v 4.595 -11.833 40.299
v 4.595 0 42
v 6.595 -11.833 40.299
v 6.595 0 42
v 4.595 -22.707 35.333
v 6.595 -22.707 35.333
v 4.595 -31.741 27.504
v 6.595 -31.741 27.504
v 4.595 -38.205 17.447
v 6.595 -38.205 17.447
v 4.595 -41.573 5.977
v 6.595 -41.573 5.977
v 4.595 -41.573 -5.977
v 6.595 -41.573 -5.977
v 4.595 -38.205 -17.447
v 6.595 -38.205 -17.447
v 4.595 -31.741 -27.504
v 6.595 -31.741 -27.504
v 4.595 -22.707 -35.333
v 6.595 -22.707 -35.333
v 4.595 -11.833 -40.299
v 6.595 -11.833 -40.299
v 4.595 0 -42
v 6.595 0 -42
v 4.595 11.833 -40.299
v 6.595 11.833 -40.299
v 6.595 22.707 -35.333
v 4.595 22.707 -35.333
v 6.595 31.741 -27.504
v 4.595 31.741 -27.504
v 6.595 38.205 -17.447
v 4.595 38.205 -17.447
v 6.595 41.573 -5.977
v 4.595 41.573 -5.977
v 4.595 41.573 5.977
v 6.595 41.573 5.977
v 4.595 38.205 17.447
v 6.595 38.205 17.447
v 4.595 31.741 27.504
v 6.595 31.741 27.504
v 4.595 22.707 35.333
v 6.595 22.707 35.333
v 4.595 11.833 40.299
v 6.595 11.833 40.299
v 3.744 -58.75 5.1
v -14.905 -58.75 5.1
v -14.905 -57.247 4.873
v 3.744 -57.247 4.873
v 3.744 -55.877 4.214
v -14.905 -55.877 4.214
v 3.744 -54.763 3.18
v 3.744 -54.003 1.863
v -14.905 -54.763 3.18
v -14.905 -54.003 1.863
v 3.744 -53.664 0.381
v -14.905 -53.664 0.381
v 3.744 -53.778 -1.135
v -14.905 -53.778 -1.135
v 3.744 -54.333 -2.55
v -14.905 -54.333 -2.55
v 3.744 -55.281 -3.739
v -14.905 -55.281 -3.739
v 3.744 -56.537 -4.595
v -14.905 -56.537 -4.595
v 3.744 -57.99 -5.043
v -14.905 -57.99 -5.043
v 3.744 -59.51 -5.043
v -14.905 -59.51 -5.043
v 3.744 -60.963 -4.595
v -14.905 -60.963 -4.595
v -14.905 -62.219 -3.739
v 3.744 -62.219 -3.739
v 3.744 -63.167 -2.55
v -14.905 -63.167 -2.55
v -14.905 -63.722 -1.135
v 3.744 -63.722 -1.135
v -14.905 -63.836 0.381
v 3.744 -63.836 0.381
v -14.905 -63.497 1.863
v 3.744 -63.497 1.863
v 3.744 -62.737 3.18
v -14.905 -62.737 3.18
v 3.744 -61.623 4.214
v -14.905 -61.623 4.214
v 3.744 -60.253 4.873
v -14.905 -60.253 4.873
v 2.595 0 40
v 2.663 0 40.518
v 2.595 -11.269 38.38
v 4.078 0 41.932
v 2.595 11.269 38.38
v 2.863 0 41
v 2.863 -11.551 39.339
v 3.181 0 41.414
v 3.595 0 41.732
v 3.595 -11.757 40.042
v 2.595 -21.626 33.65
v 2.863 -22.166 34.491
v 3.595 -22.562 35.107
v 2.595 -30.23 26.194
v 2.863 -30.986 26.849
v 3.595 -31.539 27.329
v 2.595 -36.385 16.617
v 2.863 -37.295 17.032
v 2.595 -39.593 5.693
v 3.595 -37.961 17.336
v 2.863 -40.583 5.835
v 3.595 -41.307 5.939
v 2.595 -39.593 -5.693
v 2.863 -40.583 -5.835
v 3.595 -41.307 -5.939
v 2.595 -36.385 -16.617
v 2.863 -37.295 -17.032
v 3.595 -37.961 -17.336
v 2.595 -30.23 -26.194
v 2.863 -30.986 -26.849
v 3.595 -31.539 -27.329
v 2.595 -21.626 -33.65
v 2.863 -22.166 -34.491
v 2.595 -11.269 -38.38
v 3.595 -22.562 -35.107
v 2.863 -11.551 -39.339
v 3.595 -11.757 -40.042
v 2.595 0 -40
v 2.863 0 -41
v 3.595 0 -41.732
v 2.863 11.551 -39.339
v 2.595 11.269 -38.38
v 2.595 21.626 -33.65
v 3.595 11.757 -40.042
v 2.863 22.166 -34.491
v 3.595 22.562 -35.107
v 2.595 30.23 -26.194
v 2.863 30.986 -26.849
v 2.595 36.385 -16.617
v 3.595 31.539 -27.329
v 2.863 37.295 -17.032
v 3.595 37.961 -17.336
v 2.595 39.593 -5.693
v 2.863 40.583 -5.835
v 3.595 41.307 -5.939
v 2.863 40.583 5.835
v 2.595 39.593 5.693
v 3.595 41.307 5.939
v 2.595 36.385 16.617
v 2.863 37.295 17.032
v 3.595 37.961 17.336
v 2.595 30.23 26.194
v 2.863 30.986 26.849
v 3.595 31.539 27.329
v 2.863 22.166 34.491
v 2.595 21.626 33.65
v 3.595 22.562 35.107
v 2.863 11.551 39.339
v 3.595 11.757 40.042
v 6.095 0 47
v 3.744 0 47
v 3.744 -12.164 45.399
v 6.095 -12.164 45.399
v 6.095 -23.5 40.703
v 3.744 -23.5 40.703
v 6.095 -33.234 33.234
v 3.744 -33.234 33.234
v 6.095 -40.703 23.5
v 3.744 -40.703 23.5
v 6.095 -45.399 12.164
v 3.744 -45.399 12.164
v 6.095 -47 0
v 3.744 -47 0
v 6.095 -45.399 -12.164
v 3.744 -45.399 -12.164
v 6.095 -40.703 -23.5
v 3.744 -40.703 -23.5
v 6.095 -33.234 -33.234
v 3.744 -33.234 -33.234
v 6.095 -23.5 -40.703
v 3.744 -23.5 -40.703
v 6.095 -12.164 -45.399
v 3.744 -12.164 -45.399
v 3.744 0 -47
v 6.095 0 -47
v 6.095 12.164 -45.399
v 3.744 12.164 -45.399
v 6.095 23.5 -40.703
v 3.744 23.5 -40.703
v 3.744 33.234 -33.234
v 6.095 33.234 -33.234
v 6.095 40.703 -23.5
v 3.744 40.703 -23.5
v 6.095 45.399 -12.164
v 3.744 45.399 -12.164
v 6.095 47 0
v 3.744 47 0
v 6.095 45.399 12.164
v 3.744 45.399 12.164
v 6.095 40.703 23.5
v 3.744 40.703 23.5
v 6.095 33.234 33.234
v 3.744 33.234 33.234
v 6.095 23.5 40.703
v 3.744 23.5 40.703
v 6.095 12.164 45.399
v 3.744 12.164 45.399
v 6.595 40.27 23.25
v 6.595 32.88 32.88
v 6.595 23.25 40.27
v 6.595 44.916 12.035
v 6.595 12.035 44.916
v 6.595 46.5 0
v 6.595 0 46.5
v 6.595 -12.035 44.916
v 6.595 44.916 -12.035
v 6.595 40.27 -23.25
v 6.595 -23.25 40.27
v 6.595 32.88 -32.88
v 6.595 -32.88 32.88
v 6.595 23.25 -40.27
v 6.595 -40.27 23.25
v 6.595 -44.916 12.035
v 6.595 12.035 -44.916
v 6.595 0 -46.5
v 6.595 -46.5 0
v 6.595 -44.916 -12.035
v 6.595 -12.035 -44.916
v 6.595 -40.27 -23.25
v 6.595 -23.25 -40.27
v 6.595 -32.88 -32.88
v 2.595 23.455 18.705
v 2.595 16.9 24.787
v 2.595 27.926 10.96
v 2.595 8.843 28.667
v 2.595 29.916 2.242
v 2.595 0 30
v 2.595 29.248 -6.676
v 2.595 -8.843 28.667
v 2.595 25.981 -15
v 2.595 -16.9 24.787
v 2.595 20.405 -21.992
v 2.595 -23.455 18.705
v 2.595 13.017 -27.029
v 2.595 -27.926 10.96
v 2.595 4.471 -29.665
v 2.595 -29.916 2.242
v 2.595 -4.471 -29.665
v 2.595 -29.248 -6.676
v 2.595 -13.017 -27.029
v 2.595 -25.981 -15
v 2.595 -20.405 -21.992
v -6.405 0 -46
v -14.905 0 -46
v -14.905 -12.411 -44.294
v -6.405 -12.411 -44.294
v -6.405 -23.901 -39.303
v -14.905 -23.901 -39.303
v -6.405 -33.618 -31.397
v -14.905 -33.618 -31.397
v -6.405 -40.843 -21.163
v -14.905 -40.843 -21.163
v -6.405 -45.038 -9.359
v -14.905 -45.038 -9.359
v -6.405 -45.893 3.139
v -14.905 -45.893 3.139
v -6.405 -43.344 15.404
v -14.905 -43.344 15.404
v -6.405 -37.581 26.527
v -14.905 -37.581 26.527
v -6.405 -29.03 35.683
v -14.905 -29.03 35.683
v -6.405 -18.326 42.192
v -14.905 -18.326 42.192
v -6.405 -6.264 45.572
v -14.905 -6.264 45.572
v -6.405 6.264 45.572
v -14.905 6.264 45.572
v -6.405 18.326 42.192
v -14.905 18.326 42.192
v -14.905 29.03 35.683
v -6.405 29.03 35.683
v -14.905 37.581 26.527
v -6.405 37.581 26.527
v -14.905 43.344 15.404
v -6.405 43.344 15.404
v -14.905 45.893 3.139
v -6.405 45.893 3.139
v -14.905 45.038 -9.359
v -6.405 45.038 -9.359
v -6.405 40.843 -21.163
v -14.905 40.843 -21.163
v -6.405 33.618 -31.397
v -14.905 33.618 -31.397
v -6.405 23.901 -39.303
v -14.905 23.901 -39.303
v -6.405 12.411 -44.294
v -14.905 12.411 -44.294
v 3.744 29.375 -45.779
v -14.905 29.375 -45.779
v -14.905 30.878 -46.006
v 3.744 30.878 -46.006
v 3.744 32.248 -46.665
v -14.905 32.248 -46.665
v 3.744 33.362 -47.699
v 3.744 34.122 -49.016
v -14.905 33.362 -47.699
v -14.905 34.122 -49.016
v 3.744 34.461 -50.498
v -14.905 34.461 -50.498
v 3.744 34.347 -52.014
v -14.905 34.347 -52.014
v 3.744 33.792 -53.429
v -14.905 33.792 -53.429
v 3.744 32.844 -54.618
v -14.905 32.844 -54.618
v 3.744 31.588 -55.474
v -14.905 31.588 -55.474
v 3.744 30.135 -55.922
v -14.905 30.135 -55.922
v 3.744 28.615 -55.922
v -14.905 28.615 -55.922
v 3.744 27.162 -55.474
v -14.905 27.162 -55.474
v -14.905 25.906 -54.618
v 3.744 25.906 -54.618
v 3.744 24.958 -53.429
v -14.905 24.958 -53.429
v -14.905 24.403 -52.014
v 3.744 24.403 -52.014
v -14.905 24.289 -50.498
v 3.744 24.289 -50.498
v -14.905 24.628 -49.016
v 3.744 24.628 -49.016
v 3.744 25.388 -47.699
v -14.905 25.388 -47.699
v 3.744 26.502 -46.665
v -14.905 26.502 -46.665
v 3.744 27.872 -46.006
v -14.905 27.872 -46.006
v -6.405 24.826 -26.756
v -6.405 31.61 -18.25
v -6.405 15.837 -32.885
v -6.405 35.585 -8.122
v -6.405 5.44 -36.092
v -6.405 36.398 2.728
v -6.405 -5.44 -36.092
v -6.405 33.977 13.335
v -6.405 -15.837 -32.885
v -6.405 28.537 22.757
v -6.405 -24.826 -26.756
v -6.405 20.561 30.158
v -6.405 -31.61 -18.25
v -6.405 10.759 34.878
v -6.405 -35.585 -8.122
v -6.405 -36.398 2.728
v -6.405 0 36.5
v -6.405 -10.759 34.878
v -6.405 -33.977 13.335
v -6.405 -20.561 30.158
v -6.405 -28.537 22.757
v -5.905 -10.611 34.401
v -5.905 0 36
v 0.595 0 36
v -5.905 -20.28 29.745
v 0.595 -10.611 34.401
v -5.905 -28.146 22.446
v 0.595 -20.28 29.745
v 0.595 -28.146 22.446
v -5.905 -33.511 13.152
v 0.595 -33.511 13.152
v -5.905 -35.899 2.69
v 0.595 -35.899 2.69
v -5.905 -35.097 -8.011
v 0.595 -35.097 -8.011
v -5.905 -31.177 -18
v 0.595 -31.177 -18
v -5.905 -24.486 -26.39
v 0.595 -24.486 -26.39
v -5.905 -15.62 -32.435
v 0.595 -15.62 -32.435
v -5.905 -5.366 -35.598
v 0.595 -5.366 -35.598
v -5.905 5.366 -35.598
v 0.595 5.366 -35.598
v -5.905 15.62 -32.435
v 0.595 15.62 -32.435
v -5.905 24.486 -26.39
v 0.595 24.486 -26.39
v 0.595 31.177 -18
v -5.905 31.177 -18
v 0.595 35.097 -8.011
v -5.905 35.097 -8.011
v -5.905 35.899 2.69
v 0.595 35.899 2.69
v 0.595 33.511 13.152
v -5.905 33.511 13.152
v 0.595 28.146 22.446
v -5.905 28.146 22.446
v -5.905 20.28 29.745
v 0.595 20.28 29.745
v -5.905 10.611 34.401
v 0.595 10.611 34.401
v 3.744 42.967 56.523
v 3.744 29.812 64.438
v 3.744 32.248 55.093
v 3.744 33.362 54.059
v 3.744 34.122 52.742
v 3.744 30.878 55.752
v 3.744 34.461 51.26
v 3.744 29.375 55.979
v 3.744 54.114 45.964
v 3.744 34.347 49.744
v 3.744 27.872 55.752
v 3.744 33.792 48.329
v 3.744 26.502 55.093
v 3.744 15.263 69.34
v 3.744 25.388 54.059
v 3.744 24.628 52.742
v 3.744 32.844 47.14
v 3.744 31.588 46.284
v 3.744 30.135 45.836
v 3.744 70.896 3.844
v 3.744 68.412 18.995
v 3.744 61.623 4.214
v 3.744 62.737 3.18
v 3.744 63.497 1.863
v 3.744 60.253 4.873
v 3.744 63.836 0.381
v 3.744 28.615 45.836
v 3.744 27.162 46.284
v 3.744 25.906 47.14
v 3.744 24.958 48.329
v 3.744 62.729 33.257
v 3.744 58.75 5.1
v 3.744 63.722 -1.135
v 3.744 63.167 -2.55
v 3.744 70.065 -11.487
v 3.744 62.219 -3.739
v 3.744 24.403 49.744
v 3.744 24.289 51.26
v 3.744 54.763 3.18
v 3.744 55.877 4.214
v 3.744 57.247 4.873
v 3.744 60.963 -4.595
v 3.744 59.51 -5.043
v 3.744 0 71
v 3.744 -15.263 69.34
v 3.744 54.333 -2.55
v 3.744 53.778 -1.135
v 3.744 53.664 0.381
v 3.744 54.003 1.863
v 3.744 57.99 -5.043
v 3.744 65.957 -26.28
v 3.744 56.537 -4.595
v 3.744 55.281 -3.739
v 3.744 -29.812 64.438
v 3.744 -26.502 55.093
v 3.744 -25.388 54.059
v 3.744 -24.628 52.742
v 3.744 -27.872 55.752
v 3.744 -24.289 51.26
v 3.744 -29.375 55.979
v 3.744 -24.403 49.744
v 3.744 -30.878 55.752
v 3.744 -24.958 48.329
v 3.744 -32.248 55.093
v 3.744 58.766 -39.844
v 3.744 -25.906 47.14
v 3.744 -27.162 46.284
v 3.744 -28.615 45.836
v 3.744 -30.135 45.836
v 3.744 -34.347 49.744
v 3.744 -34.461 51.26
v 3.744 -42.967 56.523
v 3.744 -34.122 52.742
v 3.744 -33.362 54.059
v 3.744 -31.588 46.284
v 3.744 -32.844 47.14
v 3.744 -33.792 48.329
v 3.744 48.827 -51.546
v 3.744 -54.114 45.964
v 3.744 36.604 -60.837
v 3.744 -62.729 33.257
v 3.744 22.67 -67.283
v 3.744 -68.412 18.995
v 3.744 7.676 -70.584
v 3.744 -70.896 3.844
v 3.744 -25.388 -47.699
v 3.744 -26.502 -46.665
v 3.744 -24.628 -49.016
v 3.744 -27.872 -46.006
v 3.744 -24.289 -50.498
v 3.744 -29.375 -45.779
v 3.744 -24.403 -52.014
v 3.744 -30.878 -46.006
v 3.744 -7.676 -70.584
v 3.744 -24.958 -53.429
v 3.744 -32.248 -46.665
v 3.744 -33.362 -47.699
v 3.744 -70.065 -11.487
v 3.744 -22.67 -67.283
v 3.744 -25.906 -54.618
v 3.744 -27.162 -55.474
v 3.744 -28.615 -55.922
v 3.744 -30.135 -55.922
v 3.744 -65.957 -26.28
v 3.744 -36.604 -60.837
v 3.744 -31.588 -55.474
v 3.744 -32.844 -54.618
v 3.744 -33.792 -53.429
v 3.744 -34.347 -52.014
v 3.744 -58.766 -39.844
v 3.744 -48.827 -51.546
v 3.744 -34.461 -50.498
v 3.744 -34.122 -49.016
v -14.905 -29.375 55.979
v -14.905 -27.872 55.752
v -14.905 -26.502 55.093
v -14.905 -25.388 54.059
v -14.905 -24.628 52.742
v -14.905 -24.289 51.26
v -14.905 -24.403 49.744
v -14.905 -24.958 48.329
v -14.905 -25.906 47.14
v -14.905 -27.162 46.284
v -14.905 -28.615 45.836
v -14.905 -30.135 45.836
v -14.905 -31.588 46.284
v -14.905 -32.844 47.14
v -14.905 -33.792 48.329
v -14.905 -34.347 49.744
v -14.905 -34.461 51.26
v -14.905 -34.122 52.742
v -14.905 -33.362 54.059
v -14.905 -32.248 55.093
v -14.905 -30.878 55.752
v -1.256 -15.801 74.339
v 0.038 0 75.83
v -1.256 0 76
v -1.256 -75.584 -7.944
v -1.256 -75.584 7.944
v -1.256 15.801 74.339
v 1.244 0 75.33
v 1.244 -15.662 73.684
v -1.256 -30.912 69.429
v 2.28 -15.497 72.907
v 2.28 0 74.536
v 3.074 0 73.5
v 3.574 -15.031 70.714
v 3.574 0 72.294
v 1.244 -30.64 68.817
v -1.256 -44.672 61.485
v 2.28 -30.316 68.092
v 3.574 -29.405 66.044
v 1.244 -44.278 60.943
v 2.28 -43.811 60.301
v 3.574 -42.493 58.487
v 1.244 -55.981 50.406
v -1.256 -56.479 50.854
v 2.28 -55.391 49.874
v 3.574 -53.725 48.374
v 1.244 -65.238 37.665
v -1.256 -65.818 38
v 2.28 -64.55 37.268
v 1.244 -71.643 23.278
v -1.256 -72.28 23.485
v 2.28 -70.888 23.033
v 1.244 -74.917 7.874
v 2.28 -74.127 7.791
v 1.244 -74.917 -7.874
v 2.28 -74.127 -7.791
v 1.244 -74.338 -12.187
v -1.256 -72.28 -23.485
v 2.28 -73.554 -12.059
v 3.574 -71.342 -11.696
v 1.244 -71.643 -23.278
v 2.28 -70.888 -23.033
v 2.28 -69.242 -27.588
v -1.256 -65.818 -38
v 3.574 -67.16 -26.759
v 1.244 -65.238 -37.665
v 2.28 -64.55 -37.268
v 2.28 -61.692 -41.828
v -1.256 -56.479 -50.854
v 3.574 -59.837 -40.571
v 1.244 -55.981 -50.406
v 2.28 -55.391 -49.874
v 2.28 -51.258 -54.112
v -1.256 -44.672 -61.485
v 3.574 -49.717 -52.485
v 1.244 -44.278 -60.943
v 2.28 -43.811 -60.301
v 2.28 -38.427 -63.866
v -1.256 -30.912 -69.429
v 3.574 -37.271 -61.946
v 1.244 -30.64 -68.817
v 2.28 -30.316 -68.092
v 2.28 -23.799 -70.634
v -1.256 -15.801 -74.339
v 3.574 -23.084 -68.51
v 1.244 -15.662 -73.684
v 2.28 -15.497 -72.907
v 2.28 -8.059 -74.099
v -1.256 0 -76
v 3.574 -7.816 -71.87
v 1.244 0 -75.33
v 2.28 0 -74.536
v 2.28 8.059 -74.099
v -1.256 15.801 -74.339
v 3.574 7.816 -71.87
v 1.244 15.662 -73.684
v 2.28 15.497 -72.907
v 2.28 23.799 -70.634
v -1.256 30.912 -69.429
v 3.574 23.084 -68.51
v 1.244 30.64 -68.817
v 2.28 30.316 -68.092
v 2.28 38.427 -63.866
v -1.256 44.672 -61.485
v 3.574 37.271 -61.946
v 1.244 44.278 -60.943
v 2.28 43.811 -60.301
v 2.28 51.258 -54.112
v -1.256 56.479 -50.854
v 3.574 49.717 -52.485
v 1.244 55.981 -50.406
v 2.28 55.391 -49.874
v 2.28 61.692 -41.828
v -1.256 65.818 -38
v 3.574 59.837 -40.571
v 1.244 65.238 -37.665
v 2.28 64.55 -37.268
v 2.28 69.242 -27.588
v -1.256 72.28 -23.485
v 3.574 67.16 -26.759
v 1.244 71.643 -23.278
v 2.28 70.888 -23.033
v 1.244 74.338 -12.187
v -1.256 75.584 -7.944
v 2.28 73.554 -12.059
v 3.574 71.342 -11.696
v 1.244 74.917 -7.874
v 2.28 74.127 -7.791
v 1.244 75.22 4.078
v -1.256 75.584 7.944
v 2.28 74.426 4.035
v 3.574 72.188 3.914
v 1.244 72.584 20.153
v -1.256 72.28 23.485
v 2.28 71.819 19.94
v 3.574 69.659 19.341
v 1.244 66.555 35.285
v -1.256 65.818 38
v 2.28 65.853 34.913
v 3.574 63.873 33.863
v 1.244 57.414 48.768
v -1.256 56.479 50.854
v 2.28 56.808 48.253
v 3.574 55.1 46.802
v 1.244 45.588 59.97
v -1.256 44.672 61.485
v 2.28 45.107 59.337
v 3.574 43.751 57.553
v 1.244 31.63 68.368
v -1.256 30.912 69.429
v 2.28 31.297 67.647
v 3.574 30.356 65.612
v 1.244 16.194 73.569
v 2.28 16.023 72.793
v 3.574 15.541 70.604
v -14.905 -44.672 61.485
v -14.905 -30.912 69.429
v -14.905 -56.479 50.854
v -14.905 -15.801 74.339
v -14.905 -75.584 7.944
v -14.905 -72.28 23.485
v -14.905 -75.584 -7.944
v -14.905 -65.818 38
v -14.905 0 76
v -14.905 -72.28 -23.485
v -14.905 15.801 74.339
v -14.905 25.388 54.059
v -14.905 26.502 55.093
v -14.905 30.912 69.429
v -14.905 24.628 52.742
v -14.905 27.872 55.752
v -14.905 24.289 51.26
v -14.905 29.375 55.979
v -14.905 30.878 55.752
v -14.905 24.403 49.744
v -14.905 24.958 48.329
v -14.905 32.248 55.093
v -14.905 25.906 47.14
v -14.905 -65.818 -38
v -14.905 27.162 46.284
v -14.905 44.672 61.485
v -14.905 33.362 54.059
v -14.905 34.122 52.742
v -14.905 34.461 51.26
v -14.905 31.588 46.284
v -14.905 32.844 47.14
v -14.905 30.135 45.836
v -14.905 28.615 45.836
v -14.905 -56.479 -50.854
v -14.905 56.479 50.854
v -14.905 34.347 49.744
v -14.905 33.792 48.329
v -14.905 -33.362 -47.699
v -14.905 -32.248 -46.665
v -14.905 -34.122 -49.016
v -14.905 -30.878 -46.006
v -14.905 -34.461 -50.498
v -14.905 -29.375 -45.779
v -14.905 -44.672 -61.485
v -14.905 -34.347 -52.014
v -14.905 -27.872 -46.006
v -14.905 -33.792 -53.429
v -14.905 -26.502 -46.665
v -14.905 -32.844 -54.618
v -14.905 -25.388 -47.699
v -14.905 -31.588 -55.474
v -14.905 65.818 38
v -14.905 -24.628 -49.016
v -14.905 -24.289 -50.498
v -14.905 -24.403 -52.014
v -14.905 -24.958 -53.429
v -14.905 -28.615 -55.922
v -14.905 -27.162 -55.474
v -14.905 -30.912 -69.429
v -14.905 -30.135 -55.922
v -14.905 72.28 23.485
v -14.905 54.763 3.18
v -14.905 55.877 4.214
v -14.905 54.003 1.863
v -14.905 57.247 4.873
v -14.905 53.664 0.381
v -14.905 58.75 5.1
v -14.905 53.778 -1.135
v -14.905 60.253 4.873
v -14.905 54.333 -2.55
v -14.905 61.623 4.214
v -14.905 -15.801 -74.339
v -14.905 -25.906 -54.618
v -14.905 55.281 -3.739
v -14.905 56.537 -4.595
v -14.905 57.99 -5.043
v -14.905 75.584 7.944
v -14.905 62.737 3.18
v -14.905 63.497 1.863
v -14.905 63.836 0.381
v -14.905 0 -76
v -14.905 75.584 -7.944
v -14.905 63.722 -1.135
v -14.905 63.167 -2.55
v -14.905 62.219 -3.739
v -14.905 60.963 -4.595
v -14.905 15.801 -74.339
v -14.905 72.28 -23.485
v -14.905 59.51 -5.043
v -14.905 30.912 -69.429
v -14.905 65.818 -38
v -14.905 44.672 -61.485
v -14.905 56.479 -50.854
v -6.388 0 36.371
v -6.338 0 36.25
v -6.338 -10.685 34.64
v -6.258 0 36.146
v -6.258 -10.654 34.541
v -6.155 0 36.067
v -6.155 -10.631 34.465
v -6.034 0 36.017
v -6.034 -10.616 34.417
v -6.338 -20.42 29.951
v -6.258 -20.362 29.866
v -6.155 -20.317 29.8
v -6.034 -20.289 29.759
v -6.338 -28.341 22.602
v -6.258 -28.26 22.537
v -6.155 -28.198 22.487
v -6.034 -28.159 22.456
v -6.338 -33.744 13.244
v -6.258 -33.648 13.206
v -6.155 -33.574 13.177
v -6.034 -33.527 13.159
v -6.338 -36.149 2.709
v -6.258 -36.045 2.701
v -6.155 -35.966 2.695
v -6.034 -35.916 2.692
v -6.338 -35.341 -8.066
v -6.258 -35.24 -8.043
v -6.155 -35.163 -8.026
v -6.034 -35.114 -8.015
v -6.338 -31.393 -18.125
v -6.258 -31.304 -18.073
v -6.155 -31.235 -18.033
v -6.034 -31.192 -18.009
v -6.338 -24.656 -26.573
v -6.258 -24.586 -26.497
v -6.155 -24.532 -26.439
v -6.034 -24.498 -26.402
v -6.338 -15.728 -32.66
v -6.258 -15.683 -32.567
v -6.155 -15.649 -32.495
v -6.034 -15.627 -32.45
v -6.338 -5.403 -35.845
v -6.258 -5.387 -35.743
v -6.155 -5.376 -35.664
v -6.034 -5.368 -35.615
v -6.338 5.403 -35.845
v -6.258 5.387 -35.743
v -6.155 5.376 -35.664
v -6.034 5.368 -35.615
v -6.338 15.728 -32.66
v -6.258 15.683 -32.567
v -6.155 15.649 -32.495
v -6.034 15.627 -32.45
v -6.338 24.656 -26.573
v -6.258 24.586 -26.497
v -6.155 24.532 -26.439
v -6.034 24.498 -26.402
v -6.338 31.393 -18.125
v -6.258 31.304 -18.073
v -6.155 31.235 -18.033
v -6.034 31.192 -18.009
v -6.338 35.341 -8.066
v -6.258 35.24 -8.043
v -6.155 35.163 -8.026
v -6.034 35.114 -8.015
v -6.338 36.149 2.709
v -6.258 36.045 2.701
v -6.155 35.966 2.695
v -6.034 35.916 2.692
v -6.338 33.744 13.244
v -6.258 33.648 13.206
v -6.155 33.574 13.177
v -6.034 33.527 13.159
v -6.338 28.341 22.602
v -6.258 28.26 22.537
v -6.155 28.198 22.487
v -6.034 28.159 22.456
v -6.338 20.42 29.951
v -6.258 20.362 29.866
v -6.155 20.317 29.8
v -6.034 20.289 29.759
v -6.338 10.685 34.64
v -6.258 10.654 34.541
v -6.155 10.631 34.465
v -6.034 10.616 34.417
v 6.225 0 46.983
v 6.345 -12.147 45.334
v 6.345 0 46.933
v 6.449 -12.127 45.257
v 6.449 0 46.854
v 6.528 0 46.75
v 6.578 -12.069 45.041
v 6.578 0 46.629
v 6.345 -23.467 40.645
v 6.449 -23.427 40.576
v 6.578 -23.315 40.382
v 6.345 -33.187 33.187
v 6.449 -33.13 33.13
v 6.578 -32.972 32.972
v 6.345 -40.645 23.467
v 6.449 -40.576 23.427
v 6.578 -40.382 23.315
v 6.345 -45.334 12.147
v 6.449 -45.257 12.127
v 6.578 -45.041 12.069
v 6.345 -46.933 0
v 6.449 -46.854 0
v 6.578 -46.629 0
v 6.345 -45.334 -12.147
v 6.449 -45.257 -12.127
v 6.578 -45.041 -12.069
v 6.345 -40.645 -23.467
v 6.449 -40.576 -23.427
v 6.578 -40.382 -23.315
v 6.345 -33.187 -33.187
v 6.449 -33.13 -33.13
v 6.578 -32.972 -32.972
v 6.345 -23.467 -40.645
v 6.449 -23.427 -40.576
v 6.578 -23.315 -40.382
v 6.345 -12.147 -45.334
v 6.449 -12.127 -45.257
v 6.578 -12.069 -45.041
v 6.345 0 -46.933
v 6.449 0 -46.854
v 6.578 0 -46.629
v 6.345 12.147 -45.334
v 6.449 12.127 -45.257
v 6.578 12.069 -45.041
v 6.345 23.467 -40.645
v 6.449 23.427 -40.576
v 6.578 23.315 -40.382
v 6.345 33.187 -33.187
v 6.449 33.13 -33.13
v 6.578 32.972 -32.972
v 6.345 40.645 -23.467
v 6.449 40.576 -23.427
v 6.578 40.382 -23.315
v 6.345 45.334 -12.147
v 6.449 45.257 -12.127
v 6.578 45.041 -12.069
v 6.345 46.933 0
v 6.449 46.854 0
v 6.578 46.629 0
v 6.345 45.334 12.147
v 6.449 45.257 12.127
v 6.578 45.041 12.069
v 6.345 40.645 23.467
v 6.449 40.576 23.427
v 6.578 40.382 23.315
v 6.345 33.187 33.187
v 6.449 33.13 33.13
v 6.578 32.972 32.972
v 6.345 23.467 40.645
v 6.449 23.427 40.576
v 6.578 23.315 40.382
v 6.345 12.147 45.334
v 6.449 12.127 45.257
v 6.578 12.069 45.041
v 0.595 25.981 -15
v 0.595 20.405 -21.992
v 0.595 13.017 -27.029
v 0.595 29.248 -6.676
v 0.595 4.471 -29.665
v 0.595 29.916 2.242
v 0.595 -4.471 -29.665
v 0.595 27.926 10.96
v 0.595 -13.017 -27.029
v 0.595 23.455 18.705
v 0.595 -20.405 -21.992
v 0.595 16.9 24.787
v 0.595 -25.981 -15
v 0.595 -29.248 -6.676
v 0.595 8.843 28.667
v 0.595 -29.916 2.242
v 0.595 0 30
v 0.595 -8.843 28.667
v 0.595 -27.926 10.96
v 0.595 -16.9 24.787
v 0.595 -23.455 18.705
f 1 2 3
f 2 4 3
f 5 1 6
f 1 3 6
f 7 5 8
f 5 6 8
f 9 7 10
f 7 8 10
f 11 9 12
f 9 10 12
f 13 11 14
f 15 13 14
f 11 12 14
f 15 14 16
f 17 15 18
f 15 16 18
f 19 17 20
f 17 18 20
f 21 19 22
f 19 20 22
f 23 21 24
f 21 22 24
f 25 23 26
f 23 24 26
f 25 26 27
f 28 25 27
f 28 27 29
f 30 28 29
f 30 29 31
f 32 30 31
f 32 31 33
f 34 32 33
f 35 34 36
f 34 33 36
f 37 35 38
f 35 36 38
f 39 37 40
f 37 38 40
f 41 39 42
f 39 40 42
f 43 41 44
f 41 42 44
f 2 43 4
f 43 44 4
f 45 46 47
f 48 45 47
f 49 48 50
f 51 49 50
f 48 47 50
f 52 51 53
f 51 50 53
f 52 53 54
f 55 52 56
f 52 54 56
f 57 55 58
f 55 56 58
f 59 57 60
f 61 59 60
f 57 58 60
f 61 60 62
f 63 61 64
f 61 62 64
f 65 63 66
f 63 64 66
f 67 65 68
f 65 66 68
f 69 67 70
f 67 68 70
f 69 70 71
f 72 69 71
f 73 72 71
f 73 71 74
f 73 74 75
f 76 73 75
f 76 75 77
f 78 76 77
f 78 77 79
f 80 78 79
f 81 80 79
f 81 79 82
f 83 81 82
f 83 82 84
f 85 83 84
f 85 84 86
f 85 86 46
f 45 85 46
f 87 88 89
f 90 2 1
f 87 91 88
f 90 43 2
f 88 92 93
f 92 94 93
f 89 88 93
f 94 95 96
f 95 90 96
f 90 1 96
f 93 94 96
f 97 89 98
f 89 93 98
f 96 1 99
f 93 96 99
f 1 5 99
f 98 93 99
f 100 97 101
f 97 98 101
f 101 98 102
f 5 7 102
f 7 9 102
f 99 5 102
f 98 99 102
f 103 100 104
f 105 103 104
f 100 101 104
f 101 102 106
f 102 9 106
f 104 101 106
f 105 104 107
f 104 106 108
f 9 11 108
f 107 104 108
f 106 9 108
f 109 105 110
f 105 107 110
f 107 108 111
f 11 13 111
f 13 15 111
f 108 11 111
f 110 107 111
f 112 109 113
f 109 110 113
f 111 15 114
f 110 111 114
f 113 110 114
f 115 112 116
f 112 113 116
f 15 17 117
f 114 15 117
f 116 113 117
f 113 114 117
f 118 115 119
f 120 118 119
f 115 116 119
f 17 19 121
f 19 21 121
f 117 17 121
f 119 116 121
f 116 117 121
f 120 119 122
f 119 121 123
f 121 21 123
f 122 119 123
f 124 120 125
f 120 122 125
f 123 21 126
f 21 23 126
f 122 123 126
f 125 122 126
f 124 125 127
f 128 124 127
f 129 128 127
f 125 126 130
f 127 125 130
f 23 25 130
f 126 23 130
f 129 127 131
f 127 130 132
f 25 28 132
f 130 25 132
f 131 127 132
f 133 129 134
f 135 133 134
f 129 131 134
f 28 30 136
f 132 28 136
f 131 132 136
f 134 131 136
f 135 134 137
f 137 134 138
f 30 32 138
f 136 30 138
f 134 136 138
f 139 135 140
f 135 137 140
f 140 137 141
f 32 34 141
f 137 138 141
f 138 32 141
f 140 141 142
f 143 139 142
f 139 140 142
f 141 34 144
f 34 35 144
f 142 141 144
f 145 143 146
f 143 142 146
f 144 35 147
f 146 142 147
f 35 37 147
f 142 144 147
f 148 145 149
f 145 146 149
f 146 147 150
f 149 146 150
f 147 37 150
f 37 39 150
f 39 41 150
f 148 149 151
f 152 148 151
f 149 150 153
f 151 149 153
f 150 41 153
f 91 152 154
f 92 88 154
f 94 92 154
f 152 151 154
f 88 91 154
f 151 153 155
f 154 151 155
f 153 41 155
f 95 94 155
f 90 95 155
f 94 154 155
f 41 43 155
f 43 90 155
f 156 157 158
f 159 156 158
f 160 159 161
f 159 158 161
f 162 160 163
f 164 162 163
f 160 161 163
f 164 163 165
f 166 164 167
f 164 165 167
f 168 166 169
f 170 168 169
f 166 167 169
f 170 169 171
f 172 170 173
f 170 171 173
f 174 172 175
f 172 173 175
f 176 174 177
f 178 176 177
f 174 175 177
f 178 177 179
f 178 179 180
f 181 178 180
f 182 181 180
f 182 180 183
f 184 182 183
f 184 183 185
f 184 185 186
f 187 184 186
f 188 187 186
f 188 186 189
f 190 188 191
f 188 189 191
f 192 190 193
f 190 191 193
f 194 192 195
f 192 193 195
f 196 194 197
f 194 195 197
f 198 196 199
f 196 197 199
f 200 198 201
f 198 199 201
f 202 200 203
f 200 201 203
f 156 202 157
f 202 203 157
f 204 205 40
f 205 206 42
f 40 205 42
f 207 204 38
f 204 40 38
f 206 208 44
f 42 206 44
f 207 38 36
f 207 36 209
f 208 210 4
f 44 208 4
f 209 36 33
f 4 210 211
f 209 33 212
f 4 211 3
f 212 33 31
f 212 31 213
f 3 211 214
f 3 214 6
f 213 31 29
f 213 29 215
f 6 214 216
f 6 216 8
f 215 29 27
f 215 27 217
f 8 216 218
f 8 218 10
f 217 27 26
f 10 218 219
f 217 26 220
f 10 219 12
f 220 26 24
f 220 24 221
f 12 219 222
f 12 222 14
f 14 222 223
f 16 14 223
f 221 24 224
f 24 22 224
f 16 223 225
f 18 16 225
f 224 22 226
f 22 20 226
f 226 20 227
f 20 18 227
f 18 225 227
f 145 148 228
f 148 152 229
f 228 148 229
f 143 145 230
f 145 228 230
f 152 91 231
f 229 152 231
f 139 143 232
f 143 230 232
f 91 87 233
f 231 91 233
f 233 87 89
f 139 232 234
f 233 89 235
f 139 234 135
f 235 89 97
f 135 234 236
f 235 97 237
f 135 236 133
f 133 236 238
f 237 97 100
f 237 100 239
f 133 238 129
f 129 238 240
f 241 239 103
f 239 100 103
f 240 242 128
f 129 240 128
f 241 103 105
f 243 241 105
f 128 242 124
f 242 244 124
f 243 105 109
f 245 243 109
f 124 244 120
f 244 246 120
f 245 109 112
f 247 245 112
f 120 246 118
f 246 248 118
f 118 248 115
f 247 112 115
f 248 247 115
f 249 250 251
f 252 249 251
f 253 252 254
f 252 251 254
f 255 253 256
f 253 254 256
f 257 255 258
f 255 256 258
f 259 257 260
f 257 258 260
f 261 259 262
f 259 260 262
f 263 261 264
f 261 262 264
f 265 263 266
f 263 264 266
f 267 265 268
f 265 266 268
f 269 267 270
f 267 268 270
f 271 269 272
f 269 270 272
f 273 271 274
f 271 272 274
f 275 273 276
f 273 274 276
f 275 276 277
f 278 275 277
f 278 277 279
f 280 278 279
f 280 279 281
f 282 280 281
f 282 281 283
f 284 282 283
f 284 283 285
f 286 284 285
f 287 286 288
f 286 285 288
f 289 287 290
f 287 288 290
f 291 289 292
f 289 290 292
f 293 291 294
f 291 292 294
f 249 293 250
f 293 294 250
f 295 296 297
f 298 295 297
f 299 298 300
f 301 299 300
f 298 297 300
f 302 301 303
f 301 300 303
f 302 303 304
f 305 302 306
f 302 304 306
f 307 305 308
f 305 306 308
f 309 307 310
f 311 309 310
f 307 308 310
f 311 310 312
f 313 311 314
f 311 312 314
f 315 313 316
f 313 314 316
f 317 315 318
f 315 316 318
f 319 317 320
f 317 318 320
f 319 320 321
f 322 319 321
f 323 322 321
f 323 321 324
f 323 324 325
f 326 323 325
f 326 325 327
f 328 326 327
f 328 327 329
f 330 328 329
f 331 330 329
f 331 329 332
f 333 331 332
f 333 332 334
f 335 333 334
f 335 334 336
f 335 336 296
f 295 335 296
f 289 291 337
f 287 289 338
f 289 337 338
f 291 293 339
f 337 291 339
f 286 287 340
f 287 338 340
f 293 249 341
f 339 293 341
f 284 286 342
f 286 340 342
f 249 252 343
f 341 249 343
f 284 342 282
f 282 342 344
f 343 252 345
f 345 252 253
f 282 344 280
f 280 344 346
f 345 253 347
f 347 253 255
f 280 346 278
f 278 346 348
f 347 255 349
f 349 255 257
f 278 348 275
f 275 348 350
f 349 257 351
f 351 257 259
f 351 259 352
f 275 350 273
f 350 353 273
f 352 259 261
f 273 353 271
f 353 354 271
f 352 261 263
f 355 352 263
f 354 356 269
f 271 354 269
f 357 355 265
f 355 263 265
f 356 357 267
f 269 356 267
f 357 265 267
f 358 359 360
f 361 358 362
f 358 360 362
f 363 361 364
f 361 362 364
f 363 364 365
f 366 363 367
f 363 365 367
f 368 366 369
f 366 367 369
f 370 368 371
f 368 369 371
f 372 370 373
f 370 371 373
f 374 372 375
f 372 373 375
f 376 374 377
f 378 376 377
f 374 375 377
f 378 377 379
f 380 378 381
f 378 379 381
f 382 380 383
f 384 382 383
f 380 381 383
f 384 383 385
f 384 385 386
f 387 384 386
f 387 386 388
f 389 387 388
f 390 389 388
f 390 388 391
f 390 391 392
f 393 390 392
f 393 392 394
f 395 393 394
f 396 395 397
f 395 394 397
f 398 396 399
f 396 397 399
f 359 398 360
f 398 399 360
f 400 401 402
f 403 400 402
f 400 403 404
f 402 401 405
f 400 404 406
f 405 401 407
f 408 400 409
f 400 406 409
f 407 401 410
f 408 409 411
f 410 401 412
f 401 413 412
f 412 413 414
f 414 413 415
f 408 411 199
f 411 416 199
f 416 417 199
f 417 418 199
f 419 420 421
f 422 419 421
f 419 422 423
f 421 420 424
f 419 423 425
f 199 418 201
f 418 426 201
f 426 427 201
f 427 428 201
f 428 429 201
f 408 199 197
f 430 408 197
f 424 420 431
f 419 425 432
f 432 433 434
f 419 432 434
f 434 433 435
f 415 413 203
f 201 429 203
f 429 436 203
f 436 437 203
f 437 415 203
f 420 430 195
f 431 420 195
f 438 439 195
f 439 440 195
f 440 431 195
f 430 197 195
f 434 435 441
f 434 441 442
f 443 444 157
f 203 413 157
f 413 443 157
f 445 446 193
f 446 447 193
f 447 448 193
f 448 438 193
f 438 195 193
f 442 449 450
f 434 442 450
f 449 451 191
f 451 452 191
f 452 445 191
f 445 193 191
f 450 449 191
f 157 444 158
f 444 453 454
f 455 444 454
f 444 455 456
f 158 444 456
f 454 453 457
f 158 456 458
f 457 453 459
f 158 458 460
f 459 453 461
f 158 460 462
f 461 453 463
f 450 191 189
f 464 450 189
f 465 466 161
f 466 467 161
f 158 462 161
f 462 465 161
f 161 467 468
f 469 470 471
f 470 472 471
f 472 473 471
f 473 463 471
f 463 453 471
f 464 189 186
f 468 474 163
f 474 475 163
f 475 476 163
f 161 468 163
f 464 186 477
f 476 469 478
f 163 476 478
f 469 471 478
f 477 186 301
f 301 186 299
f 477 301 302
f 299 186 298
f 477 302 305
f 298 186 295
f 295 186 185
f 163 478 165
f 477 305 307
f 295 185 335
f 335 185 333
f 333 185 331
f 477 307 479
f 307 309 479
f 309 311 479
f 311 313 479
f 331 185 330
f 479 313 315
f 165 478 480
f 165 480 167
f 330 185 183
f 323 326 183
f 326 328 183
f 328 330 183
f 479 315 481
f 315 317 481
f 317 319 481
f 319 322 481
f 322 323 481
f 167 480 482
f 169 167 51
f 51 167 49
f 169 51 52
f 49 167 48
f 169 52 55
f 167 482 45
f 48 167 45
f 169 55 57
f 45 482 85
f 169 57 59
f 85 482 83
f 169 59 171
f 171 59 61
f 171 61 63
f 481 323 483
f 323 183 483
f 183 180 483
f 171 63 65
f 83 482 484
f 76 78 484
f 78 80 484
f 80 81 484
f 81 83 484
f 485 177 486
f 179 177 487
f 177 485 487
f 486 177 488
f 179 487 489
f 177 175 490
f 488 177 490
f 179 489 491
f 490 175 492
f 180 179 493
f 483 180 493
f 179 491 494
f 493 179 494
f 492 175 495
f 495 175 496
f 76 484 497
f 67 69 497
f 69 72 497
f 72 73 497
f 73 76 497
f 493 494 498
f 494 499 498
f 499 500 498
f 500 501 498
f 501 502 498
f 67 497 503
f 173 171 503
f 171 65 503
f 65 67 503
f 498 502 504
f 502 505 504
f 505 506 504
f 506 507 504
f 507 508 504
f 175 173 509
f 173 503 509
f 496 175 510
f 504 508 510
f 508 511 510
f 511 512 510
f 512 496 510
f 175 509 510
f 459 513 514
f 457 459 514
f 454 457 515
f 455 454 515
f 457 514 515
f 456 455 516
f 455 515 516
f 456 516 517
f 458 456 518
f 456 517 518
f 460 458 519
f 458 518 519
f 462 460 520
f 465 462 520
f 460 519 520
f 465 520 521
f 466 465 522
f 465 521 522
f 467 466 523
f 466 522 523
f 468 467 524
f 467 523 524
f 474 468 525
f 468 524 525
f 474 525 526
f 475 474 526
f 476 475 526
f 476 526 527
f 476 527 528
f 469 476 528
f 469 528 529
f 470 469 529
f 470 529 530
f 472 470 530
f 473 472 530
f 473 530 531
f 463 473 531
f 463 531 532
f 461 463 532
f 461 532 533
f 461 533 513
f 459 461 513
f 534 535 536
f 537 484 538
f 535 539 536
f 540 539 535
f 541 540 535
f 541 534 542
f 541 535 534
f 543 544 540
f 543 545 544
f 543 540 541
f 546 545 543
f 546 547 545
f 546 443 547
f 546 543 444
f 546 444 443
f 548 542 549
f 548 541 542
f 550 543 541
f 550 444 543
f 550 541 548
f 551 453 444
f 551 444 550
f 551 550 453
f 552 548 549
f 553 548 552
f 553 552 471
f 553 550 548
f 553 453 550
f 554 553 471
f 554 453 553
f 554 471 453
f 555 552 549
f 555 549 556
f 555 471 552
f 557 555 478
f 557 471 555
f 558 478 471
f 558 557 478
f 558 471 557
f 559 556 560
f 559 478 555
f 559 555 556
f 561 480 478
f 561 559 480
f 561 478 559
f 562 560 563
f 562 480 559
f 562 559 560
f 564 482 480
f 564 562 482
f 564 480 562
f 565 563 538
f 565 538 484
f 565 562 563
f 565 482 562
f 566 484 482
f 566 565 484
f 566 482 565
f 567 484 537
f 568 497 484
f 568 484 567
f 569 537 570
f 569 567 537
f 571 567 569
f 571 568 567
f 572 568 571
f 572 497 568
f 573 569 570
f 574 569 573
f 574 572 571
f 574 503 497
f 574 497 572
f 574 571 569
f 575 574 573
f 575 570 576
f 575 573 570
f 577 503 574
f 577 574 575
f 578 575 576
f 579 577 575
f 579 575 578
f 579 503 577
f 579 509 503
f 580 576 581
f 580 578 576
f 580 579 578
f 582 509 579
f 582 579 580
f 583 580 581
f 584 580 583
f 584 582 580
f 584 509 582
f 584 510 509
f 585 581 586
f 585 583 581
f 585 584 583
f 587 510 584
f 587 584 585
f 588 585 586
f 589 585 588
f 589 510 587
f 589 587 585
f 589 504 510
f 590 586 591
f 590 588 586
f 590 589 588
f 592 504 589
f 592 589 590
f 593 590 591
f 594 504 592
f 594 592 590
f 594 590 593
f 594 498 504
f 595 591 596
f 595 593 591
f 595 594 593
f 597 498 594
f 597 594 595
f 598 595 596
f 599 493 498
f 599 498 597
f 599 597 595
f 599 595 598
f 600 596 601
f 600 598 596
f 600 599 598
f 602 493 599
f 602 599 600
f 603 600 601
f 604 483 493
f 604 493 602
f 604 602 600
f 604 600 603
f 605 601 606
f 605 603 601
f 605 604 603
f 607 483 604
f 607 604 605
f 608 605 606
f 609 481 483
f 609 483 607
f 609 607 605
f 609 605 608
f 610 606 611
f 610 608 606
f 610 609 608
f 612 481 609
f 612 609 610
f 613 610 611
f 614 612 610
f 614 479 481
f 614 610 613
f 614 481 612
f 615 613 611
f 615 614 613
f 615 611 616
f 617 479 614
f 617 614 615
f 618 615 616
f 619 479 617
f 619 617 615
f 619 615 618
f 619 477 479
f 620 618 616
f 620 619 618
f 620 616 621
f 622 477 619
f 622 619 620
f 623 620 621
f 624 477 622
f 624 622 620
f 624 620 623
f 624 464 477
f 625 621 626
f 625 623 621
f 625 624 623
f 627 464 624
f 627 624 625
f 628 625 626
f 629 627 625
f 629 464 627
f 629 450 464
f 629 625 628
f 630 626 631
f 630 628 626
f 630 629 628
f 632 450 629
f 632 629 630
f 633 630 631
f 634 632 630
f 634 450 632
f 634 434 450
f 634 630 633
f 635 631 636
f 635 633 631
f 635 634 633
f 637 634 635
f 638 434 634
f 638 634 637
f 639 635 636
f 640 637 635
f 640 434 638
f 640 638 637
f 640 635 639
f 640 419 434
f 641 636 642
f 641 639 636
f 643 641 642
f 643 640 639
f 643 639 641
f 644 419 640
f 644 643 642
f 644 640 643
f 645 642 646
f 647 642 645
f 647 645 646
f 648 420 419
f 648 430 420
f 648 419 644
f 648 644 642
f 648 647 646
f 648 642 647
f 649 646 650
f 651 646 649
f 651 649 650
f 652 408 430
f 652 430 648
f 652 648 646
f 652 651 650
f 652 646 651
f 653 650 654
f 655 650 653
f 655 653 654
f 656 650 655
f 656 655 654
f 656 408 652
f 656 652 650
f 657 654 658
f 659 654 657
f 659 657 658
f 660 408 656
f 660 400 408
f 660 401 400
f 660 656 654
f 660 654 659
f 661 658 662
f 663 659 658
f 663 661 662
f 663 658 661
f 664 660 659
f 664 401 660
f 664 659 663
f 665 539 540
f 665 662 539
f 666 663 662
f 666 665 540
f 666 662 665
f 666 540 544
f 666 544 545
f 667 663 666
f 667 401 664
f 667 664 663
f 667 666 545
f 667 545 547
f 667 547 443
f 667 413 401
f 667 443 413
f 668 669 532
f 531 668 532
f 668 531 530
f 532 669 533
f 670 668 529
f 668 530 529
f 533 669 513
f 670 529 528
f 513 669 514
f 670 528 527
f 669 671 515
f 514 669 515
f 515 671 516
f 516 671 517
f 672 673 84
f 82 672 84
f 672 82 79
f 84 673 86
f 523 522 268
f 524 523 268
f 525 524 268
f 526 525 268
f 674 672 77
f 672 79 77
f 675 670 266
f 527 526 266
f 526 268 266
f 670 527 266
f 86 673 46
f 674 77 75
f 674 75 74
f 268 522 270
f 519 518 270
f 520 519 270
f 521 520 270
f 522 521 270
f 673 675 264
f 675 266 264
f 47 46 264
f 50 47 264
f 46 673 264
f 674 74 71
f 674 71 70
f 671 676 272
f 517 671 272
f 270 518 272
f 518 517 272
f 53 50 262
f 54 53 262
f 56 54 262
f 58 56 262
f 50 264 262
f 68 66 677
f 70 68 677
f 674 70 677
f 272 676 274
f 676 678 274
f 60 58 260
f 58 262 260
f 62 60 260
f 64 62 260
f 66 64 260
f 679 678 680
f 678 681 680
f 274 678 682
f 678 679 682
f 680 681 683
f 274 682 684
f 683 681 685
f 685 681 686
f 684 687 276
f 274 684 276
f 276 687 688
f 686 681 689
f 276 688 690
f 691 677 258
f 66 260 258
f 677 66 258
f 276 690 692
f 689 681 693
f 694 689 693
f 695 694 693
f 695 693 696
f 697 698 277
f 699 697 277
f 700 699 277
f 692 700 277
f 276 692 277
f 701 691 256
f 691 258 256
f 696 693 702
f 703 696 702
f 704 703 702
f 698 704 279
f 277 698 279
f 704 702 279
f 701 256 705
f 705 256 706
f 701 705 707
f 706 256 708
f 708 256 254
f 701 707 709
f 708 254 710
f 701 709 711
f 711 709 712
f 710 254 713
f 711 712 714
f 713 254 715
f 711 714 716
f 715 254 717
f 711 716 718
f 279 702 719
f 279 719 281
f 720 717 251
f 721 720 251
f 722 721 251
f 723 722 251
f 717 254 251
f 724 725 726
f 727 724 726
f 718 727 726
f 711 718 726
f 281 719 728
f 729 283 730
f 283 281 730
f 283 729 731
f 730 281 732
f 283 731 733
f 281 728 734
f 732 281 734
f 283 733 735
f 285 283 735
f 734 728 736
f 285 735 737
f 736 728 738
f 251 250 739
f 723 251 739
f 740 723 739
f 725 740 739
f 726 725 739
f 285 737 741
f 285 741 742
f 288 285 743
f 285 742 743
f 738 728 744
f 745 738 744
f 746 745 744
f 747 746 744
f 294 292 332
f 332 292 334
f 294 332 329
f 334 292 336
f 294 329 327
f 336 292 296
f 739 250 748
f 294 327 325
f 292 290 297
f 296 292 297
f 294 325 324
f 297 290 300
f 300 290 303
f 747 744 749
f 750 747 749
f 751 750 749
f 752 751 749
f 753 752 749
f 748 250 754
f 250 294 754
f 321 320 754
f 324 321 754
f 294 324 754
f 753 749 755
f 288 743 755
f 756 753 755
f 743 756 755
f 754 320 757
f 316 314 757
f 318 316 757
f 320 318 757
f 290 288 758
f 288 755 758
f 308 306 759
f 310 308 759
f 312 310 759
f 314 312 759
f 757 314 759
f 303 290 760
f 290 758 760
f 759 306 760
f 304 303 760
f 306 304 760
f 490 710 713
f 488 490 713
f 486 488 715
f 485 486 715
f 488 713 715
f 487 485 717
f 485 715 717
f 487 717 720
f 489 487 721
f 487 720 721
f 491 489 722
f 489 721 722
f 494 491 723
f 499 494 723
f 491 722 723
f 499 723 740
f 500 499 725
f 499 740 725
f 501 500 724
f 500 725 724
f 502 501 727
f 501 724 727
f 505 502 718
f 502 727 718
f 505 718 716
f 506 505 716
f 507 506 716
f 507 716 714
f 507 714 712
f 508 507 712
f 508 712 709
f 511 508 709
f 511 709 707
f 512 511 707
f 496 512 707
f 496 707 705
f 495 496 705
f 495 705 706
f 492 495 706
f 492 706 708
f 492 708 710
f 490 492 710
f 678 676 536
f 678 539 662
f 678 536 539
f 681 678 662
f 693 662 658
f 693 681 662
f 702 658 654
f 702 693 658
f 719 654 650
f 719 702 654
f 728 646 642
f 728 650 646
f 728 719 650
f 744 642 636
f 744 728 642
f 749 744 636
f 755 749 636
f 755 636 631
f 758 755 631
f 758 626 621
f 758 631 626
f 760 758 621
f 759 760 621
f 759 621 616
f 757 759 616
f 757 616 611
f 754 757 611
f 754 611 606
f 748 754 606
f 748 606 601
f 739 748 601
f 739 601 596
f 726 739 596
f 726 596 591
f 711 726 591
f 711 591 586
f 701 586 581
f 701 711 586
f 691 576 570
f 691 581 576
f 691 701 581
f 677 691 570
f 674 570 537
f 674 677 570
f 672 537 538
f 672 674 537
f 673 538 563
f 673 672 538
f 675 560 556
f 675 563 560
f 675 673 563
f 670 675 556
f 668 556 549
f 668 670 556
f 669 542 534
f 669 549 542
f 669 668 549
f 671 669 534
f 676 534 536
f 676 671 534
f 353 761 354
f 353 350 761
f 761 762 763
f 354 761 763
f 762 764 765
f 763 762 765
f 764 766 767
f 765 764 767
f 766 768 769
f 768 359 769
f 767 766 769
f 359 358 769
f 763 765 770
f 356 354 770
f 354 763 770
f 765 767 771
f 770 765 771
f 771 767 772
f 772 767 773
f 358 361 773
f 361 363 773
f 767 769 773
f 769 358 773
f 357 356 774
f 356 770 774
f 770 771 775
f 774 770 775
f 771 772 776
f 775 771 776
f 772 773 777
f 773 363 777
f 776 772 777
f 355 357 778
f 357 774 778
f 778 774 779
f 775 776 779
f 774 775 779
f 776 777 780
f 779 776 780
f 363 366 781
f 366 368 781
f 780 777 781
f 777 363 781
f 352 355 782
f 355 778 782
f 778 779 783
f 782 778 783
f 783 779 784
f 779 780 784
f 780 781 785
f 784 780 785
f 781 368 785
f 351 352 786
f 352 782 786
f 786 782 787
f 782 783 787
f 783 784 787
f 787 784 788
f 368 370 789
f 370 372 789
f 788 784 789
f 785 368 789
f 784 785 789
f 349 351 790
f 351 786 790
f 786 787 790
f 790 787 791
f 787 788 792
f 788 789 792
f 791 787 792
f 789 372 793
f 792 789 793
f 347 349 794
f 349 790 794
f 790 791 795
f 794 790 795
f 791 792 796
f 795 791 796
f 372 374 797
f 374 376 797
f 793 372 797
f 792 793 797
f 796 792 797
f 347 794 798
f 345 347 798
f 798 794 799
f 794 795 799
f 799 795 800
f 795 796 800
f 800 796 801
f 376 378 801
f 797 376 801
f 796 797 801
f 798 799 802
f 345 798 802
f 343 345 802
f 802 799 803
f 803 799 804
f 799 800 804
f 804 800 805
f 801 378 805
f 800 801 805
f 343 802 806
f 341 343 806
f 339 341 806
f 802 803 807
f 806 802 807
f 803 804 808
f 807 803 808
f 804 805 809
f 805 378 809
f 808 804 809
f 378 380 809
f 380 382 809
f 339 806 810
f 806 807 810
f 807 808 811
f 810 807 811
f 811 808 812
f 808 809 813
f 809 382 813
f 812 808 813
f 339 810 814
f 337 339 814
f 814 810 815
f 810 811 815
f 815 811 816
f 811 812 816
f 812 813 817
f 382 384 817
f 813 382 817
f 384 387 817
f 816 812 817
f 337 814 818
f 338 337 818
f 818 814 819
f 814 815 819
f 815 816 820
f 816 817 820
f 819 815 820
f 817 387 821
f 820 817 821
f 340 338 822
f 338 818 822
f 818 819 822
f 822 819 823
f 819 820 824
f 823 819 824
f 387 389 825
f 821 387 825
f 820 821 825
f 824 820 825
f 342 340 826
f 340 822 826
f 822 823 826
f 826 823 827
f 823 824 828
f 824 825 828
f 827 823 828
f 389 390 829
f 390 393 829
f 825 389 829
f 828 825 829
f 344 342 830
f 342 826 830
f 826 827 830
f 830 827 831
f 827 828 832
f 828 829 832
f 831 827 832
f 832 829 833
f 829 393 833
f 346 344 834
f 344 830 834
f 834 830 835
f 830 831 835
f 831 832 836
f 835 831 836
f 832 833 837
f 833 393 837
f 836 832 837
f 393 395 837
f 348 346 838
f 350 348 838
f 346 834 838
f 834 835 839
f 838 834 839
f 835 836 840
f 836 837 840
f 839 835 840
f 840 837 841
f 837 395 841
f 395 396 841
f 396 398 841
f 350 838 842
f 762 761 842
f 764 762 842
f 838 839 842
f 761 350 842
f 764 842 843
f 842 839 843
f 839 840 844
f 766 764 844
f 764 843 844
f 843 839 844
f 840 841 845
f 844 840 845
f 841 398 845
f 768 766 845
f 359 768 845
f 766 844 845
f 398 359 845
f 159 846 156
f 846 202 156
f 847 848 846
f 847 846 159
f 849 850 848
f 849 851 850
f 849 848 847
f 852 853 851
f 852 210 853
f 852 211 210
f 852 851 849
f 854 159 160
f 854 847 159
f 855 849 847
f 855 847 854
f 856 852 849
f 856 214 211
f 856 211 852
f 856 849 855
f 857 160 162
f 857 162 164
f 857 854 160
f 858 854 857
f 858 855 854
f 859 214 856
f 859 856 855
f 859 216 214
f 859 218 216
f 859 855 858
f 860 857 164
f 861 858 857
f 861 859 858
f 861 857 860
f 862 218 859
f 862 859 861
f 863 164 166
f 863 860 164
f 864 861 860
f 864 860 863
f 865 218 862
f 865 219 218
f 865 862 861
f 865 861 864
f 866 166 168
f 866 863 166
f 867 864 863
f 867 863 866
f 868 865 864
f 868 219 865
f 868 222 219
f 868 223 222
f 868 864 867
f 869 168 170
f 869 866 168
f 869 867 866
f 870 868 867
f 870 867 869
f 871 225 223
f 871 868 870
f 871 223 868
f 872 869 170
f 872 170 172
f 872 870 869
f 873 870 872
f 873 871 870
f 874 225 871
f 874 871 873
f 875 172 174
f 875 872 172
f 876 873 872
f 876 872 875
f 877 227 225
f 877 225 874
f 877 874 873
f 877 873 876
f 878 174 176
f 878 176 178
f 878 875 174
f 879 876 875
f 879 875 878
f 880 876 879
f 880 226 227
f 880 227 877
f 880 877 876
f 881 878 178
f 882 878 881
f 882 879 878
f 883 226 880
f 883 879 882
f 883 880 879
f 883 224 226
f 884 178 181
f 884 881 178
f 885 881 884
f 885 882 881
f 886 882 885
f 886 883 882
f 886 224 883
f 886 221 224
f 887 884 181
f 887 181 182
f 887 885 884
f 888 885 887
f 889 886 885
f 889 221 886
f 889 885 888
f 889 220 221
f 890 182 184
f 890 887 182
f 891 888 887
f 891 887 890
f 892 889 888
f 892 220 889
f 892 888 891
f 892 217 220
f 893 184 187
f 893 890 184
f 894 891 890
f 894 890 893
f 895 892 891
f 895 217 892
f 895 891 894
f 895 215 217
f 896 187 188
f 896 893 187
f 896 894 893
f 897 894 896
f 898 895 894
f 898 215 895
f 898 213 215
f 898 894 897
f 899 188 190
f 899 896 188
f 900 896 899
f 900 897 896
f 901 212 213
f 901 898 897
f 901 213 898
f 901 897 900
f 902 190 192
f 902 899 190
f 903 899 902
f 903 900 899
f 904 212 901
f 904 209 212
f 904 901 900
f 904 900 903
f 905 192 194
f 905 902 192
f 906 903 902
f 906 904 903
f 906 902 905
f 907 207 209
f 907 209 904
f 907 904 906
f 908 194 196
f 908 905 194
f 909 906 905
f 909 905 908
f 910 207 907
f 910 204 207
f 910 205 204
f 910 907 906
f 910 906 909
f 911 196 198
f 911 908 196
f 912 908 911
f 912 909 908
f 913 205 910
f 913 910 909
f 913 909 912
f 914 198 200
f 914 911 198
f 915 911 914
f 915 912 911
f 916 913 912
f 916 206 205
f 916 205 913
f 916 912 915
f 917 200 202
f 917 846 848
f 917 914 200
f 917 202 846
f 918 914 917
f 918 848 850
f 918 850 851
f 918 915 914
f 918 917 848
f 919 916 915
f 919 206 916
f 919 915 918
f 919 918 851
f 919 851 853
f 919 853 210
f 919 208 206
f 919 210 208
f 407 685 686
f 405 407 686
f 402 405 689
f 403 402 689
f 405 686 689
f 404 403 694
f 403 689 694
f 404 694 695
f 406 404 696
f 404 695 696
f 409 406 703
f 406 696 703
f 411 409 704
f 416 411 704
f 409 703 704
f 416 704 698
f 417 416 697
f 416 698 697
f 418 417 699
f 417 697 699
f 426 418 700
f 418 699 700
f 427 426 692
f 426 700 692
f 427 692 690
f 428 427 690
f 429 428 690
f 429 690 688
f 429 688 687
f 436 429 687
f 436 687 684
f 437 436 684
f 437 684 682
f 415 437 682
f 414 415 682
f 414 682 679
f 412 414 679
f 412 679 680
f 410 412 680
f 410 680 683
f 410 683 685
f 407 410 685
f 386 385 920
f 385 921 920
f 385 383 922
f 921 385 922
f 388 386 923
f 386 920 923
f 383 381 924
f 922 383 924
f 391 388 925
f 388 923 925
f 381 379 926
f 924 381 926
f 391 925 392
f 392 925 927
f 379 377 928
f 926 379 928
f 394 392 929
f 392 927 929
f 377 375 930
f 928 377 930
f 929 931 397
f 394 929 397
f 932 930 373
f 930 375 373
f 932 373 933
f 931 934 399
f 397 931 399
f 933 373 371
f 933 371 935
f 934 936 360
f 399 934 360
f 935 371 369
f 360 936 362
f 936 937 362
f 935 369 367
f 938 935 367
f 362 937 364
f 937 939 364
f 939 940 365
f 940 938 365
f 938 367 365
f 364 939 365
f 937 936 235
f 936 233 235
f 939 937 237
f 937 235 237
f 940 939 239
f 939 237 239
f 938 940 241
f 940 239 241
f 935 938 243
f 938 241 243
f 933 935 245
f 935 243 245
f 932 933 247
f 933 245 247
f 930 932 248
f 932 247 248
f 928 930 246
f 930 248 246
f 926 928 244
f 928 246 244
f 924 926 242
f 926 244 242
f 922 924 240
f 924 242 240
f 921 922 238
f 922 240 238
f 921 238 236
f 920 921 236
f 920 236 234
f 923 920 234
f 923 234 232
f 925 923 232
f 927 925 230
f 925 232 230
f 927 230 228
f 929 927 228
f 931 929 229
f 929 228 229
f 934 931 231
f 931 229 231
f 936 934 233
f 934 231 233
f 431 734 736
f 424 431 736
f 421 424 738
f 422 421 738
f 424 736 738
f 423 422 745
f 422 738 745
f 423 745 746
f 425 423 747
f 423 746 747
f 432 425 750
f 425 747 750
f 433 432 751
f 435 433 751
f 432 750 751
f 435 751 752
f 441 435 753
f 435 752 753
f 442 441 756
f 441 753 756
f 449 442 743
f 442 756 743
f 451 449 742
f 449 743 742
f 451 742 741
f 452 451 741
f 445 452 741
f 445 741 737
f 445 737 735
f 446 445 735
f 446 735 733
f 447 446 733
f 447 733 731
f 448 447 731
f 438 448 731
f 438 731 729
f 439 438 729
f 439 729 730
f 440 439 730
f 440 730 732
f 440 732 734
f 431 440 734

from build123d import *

# Parameters (mm, degrees)
FILLET1_R                   = 0.5
FILLET4_R                   = 0.5
BOSS_EXTRUDE2_START         = 18.65
SKETCH3_R                   = 76
SKETCH3_R_2                 = 46
BOSS_EXTRUDE2_DEPTH         = 18.65
FILLET5_R                   = 5
M12X1_75_TAPPED_HOLE1_D     = 10.2
M12X1_75_TAPPED_HOLE1_DEPTH = 29.25
M12X1_75_TAPPED_HOLE1_TIP   = 3.064389157
SKETCH6_W                   = 6.000865062
SKETCH6_H                   = 152
CUT_EXTRUDE2_DEPTH          = 99


with BuildPart() as part:
    # Sketch1 → Revolve1 (revolve)
    with BuildSketch(Plane(origin=(0, 0, 0), x_dir=(1, 0, 0), z_dir=(0, 1, 0)), mode=Mode.PRIVATE) as revolve1_sk:
        with BuildLine():
            Line((0.595225647, 30), (2.595225647, 30))
            Line((2.595225647, 30), (2.595225647, 40))
            ThreePointArc((2.595225647, 40), (3.181012085, 41.414213562), (4.595225647, 42))
            Line((4.595225647, 42), (6.595225647, 42))
            Line((6.595225647, 42), (6.595225647, 47))
            Line((6.595225647, 47), (3.744360585, 47))
            Line((3.744360585, 47), (3.744360585, 76))
            Line((3.744360585, 76), (-2.255639415, 76))
            Line((-2.255639415, 76), (-2.255639415, 49))
            ThreePointArc((-2.255639415, 49), (-3.134319072, 46.878679656), (-5.255639415, 46))
            Line((-5.255639415, 46), (-6.404774353, 46))
            Line((-6.404774353, 46), (-6.404774353, 36))
            Line((-6.404774353, 36), (0.595225647, 36))
            Line((0.595225647, 36), (0.595225647, 30))
        make_face()
    revolve(revolve1_sk.sketch.rotate(Axis((0, 0, 0), (1, 0, 0)), 180), axis=Axis((0, 0, 0), (1, 0, 0)))

    # Fillet1
    fillet1_edges = [part.edges().sort_by_distance(p)[0] for p in [
        (-6.404774353, 0, -36),
    ]]
    fillet(fillet1_edges, radius=FILLET1_R)

    # Fillet4
    fillet4_edges = [part.edges().sort_by_distance(p)[0] for p in [
        (6.595225647, 0, -47),
    ]]
    fillet(fillet4_edges, radius=FILLET4_R)

    # Sketch3 → Boss-Extrude2 (add)
    with BuildSketch(Plane.ZY.offset(2.255639415).offset(BOSS_EXTRUDE2_START)):
        Circle(SKETCH3_R)
        with Locations(Location((0, 0, 0), (0, 0, 180))):
            Circle(SKETCH3_R_2, mode=Mode.SUBTRACT)
    extrude(amount=-BOSS_EXTRUDE2_DEPTH)

    # Fillet5
    fillet5_edges = [part.edges().sort_by_distance(p)[0] for p in [
        (3.744360585, 0, -76),
    ]]
    fillet(fillet5_edges, radius=FILLET5_R)

    # M12x1.75 Tapped Hole1
    with Locations(Plane(origin=(3.744360585, 0, 0), x_dir=(0, 0, -1), z_dir=(1, 0, 0))):
        with Locations((0, 58.75), (50.878992472, 29.375), (50.878992472, -29.375), (0, -58.75), (-50.878992472, -29.375), (-50.878992472, 29.375)):
            Hole(M12X1_75_TAPPED_HOLE1_D / 2, depth=M12X1_75_TAPPED_HOLE1_DEPTH)
            with Locations((0, 0, -(M12X1_75_TAPPED_HOLE1_DEPTH + M12X1_75_TAPPED_HOLE1_TIP / 2))):  # 118° drill point
                Cone(0, M12X1_75_TAPPED_HOLE1_D / 2, M12X1_75_TAPPED_HOLE1_TIP, mode=Mode.SUBTRACT)

    # Sketch6 → Cut-Extrude2 (cut, symmetric)
    with BuildSketch(Plane(origin=(0, 0, 0), x_dir=(1, 0, 0), z_dir=(0, 1, 0))):
        with Locations((-17.905206884, 0)):
            Rectangle(SKETCH6_W, SKETCH6_H)
    extrude(amount=CUT_EXTRUDE2_DEPTH, both=True, mode=Mode.SUBTRACT)


solid = part.part
